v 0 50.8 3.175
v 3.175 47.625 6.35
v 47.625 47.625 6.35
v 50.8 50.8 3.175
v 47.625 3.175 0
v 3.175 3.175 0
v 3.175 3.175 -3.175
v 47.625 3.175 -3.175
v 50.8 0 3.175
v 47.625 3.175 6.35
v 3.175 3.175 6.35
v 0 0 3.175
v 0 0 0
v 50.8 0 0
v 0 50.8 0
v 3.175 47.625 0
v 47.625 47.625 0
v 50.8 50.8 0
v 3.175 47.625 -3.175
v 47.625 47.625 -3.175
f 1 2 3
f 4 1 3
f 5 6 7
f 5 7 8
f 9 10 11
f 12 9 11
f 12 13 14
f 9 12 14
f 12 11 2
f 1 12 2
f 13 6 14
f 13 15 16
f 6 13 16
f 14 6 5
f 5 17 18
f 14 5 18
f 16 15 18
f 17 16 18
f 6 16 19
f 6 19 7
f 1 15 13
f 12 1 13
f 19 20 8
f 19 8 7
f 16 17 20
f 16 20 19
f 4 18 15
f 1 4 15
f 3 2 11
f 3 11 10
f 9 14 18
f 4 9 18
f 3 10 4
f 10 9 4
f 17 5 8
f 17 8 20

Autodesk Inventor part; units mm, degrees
ref_plane "YZ Plane" through (0, 0, 0) normal (1, 0, 0) x (0, 1, 0)
ref_plane "XZ Plane" through (0, 0, 0) normal (0, 1, 0) x (-1, 0, 0)
ref_plane "XY Plane" through (0, 0, 0) normal (0, 0, 1) x (1, 0, 0)
sketch "Sketch1" plane through (0, 0, 0) normal (0, 0, 1) x (1, 0, 0)
  line L0 (0, 0) -> (50.8, 0)
  line L1 (50.8, 0) -> (50.8, 50.8)
  line L2 (50.8, 50.8) -> (0, 50.8)
  line L3 (0, 50.8) -> (0, 0)
  dimension "d0" = 50.8
  dimension "d1" = 50.8
extrude "Extrusion1" add sketch "Sketch1" along normal blind 3.175
sketch "Sketch2" plane through (0, 0, 0) normal (0, 0, -1) x (-1, 0, 0)
  line L0 (0, 0) -> (-50.8, 0) projected
  line L1 (-50.8, 0) -> (-50.8, 50.8) projected
  line L2 (0, 0) -> (-50.8, 0)
  line L3 (-50.8, 0) -> (-50.8, 50.8)
  line L4 (-50.8, 50.8) -> (0, 50.8)
  line L5 (0, 50.8) -> (0, 0)
  line L6 (-3.175, 3.175) -> (-47.625, 3.175)
  line L7 (-47.625, 3.175) -> (-47.625, 47.625)
  line L8 (-47.625, 47.625) -> (-3.175, 47.625)
  line L9 (-3.175, 47.625) -> (-3.175, 3.175)
  dimension "d4" = 3.175
extrude "Extrusion2" add sketch "Sketch2" along normal blind 3.175 contours L6 L7 L8 L9
sketch "Sketch4" plane through (0, 0, 3.175) normal (0, 0, 1) x (1, 0, 0)
  line L0 (0, 0) -> (50.8, 0) projected
  line L1 (50.8, 0) -> (50.8, 50.8) projected
  line L2 (0, 0) -> (50.8, 0)
  line L3 (50.8, 0) -> (50.8, 50.8)
  line L4 (50.8, 50.8) -> (0, 50.8)
  line L5 (0, 50.8) -> (0, 0)
extrude "Extrusion4" add sketch "Sketch4" along normal blind 3.175
chamfer "Chamfer1" distance 3.175 angle 45 4 edges at (50.8, 25.4, 6.35) (25.4, 0, 6.35) (0, 25.4, 6.35) (25.4, 50.8, 6.35)
properties part number "End Cap"
